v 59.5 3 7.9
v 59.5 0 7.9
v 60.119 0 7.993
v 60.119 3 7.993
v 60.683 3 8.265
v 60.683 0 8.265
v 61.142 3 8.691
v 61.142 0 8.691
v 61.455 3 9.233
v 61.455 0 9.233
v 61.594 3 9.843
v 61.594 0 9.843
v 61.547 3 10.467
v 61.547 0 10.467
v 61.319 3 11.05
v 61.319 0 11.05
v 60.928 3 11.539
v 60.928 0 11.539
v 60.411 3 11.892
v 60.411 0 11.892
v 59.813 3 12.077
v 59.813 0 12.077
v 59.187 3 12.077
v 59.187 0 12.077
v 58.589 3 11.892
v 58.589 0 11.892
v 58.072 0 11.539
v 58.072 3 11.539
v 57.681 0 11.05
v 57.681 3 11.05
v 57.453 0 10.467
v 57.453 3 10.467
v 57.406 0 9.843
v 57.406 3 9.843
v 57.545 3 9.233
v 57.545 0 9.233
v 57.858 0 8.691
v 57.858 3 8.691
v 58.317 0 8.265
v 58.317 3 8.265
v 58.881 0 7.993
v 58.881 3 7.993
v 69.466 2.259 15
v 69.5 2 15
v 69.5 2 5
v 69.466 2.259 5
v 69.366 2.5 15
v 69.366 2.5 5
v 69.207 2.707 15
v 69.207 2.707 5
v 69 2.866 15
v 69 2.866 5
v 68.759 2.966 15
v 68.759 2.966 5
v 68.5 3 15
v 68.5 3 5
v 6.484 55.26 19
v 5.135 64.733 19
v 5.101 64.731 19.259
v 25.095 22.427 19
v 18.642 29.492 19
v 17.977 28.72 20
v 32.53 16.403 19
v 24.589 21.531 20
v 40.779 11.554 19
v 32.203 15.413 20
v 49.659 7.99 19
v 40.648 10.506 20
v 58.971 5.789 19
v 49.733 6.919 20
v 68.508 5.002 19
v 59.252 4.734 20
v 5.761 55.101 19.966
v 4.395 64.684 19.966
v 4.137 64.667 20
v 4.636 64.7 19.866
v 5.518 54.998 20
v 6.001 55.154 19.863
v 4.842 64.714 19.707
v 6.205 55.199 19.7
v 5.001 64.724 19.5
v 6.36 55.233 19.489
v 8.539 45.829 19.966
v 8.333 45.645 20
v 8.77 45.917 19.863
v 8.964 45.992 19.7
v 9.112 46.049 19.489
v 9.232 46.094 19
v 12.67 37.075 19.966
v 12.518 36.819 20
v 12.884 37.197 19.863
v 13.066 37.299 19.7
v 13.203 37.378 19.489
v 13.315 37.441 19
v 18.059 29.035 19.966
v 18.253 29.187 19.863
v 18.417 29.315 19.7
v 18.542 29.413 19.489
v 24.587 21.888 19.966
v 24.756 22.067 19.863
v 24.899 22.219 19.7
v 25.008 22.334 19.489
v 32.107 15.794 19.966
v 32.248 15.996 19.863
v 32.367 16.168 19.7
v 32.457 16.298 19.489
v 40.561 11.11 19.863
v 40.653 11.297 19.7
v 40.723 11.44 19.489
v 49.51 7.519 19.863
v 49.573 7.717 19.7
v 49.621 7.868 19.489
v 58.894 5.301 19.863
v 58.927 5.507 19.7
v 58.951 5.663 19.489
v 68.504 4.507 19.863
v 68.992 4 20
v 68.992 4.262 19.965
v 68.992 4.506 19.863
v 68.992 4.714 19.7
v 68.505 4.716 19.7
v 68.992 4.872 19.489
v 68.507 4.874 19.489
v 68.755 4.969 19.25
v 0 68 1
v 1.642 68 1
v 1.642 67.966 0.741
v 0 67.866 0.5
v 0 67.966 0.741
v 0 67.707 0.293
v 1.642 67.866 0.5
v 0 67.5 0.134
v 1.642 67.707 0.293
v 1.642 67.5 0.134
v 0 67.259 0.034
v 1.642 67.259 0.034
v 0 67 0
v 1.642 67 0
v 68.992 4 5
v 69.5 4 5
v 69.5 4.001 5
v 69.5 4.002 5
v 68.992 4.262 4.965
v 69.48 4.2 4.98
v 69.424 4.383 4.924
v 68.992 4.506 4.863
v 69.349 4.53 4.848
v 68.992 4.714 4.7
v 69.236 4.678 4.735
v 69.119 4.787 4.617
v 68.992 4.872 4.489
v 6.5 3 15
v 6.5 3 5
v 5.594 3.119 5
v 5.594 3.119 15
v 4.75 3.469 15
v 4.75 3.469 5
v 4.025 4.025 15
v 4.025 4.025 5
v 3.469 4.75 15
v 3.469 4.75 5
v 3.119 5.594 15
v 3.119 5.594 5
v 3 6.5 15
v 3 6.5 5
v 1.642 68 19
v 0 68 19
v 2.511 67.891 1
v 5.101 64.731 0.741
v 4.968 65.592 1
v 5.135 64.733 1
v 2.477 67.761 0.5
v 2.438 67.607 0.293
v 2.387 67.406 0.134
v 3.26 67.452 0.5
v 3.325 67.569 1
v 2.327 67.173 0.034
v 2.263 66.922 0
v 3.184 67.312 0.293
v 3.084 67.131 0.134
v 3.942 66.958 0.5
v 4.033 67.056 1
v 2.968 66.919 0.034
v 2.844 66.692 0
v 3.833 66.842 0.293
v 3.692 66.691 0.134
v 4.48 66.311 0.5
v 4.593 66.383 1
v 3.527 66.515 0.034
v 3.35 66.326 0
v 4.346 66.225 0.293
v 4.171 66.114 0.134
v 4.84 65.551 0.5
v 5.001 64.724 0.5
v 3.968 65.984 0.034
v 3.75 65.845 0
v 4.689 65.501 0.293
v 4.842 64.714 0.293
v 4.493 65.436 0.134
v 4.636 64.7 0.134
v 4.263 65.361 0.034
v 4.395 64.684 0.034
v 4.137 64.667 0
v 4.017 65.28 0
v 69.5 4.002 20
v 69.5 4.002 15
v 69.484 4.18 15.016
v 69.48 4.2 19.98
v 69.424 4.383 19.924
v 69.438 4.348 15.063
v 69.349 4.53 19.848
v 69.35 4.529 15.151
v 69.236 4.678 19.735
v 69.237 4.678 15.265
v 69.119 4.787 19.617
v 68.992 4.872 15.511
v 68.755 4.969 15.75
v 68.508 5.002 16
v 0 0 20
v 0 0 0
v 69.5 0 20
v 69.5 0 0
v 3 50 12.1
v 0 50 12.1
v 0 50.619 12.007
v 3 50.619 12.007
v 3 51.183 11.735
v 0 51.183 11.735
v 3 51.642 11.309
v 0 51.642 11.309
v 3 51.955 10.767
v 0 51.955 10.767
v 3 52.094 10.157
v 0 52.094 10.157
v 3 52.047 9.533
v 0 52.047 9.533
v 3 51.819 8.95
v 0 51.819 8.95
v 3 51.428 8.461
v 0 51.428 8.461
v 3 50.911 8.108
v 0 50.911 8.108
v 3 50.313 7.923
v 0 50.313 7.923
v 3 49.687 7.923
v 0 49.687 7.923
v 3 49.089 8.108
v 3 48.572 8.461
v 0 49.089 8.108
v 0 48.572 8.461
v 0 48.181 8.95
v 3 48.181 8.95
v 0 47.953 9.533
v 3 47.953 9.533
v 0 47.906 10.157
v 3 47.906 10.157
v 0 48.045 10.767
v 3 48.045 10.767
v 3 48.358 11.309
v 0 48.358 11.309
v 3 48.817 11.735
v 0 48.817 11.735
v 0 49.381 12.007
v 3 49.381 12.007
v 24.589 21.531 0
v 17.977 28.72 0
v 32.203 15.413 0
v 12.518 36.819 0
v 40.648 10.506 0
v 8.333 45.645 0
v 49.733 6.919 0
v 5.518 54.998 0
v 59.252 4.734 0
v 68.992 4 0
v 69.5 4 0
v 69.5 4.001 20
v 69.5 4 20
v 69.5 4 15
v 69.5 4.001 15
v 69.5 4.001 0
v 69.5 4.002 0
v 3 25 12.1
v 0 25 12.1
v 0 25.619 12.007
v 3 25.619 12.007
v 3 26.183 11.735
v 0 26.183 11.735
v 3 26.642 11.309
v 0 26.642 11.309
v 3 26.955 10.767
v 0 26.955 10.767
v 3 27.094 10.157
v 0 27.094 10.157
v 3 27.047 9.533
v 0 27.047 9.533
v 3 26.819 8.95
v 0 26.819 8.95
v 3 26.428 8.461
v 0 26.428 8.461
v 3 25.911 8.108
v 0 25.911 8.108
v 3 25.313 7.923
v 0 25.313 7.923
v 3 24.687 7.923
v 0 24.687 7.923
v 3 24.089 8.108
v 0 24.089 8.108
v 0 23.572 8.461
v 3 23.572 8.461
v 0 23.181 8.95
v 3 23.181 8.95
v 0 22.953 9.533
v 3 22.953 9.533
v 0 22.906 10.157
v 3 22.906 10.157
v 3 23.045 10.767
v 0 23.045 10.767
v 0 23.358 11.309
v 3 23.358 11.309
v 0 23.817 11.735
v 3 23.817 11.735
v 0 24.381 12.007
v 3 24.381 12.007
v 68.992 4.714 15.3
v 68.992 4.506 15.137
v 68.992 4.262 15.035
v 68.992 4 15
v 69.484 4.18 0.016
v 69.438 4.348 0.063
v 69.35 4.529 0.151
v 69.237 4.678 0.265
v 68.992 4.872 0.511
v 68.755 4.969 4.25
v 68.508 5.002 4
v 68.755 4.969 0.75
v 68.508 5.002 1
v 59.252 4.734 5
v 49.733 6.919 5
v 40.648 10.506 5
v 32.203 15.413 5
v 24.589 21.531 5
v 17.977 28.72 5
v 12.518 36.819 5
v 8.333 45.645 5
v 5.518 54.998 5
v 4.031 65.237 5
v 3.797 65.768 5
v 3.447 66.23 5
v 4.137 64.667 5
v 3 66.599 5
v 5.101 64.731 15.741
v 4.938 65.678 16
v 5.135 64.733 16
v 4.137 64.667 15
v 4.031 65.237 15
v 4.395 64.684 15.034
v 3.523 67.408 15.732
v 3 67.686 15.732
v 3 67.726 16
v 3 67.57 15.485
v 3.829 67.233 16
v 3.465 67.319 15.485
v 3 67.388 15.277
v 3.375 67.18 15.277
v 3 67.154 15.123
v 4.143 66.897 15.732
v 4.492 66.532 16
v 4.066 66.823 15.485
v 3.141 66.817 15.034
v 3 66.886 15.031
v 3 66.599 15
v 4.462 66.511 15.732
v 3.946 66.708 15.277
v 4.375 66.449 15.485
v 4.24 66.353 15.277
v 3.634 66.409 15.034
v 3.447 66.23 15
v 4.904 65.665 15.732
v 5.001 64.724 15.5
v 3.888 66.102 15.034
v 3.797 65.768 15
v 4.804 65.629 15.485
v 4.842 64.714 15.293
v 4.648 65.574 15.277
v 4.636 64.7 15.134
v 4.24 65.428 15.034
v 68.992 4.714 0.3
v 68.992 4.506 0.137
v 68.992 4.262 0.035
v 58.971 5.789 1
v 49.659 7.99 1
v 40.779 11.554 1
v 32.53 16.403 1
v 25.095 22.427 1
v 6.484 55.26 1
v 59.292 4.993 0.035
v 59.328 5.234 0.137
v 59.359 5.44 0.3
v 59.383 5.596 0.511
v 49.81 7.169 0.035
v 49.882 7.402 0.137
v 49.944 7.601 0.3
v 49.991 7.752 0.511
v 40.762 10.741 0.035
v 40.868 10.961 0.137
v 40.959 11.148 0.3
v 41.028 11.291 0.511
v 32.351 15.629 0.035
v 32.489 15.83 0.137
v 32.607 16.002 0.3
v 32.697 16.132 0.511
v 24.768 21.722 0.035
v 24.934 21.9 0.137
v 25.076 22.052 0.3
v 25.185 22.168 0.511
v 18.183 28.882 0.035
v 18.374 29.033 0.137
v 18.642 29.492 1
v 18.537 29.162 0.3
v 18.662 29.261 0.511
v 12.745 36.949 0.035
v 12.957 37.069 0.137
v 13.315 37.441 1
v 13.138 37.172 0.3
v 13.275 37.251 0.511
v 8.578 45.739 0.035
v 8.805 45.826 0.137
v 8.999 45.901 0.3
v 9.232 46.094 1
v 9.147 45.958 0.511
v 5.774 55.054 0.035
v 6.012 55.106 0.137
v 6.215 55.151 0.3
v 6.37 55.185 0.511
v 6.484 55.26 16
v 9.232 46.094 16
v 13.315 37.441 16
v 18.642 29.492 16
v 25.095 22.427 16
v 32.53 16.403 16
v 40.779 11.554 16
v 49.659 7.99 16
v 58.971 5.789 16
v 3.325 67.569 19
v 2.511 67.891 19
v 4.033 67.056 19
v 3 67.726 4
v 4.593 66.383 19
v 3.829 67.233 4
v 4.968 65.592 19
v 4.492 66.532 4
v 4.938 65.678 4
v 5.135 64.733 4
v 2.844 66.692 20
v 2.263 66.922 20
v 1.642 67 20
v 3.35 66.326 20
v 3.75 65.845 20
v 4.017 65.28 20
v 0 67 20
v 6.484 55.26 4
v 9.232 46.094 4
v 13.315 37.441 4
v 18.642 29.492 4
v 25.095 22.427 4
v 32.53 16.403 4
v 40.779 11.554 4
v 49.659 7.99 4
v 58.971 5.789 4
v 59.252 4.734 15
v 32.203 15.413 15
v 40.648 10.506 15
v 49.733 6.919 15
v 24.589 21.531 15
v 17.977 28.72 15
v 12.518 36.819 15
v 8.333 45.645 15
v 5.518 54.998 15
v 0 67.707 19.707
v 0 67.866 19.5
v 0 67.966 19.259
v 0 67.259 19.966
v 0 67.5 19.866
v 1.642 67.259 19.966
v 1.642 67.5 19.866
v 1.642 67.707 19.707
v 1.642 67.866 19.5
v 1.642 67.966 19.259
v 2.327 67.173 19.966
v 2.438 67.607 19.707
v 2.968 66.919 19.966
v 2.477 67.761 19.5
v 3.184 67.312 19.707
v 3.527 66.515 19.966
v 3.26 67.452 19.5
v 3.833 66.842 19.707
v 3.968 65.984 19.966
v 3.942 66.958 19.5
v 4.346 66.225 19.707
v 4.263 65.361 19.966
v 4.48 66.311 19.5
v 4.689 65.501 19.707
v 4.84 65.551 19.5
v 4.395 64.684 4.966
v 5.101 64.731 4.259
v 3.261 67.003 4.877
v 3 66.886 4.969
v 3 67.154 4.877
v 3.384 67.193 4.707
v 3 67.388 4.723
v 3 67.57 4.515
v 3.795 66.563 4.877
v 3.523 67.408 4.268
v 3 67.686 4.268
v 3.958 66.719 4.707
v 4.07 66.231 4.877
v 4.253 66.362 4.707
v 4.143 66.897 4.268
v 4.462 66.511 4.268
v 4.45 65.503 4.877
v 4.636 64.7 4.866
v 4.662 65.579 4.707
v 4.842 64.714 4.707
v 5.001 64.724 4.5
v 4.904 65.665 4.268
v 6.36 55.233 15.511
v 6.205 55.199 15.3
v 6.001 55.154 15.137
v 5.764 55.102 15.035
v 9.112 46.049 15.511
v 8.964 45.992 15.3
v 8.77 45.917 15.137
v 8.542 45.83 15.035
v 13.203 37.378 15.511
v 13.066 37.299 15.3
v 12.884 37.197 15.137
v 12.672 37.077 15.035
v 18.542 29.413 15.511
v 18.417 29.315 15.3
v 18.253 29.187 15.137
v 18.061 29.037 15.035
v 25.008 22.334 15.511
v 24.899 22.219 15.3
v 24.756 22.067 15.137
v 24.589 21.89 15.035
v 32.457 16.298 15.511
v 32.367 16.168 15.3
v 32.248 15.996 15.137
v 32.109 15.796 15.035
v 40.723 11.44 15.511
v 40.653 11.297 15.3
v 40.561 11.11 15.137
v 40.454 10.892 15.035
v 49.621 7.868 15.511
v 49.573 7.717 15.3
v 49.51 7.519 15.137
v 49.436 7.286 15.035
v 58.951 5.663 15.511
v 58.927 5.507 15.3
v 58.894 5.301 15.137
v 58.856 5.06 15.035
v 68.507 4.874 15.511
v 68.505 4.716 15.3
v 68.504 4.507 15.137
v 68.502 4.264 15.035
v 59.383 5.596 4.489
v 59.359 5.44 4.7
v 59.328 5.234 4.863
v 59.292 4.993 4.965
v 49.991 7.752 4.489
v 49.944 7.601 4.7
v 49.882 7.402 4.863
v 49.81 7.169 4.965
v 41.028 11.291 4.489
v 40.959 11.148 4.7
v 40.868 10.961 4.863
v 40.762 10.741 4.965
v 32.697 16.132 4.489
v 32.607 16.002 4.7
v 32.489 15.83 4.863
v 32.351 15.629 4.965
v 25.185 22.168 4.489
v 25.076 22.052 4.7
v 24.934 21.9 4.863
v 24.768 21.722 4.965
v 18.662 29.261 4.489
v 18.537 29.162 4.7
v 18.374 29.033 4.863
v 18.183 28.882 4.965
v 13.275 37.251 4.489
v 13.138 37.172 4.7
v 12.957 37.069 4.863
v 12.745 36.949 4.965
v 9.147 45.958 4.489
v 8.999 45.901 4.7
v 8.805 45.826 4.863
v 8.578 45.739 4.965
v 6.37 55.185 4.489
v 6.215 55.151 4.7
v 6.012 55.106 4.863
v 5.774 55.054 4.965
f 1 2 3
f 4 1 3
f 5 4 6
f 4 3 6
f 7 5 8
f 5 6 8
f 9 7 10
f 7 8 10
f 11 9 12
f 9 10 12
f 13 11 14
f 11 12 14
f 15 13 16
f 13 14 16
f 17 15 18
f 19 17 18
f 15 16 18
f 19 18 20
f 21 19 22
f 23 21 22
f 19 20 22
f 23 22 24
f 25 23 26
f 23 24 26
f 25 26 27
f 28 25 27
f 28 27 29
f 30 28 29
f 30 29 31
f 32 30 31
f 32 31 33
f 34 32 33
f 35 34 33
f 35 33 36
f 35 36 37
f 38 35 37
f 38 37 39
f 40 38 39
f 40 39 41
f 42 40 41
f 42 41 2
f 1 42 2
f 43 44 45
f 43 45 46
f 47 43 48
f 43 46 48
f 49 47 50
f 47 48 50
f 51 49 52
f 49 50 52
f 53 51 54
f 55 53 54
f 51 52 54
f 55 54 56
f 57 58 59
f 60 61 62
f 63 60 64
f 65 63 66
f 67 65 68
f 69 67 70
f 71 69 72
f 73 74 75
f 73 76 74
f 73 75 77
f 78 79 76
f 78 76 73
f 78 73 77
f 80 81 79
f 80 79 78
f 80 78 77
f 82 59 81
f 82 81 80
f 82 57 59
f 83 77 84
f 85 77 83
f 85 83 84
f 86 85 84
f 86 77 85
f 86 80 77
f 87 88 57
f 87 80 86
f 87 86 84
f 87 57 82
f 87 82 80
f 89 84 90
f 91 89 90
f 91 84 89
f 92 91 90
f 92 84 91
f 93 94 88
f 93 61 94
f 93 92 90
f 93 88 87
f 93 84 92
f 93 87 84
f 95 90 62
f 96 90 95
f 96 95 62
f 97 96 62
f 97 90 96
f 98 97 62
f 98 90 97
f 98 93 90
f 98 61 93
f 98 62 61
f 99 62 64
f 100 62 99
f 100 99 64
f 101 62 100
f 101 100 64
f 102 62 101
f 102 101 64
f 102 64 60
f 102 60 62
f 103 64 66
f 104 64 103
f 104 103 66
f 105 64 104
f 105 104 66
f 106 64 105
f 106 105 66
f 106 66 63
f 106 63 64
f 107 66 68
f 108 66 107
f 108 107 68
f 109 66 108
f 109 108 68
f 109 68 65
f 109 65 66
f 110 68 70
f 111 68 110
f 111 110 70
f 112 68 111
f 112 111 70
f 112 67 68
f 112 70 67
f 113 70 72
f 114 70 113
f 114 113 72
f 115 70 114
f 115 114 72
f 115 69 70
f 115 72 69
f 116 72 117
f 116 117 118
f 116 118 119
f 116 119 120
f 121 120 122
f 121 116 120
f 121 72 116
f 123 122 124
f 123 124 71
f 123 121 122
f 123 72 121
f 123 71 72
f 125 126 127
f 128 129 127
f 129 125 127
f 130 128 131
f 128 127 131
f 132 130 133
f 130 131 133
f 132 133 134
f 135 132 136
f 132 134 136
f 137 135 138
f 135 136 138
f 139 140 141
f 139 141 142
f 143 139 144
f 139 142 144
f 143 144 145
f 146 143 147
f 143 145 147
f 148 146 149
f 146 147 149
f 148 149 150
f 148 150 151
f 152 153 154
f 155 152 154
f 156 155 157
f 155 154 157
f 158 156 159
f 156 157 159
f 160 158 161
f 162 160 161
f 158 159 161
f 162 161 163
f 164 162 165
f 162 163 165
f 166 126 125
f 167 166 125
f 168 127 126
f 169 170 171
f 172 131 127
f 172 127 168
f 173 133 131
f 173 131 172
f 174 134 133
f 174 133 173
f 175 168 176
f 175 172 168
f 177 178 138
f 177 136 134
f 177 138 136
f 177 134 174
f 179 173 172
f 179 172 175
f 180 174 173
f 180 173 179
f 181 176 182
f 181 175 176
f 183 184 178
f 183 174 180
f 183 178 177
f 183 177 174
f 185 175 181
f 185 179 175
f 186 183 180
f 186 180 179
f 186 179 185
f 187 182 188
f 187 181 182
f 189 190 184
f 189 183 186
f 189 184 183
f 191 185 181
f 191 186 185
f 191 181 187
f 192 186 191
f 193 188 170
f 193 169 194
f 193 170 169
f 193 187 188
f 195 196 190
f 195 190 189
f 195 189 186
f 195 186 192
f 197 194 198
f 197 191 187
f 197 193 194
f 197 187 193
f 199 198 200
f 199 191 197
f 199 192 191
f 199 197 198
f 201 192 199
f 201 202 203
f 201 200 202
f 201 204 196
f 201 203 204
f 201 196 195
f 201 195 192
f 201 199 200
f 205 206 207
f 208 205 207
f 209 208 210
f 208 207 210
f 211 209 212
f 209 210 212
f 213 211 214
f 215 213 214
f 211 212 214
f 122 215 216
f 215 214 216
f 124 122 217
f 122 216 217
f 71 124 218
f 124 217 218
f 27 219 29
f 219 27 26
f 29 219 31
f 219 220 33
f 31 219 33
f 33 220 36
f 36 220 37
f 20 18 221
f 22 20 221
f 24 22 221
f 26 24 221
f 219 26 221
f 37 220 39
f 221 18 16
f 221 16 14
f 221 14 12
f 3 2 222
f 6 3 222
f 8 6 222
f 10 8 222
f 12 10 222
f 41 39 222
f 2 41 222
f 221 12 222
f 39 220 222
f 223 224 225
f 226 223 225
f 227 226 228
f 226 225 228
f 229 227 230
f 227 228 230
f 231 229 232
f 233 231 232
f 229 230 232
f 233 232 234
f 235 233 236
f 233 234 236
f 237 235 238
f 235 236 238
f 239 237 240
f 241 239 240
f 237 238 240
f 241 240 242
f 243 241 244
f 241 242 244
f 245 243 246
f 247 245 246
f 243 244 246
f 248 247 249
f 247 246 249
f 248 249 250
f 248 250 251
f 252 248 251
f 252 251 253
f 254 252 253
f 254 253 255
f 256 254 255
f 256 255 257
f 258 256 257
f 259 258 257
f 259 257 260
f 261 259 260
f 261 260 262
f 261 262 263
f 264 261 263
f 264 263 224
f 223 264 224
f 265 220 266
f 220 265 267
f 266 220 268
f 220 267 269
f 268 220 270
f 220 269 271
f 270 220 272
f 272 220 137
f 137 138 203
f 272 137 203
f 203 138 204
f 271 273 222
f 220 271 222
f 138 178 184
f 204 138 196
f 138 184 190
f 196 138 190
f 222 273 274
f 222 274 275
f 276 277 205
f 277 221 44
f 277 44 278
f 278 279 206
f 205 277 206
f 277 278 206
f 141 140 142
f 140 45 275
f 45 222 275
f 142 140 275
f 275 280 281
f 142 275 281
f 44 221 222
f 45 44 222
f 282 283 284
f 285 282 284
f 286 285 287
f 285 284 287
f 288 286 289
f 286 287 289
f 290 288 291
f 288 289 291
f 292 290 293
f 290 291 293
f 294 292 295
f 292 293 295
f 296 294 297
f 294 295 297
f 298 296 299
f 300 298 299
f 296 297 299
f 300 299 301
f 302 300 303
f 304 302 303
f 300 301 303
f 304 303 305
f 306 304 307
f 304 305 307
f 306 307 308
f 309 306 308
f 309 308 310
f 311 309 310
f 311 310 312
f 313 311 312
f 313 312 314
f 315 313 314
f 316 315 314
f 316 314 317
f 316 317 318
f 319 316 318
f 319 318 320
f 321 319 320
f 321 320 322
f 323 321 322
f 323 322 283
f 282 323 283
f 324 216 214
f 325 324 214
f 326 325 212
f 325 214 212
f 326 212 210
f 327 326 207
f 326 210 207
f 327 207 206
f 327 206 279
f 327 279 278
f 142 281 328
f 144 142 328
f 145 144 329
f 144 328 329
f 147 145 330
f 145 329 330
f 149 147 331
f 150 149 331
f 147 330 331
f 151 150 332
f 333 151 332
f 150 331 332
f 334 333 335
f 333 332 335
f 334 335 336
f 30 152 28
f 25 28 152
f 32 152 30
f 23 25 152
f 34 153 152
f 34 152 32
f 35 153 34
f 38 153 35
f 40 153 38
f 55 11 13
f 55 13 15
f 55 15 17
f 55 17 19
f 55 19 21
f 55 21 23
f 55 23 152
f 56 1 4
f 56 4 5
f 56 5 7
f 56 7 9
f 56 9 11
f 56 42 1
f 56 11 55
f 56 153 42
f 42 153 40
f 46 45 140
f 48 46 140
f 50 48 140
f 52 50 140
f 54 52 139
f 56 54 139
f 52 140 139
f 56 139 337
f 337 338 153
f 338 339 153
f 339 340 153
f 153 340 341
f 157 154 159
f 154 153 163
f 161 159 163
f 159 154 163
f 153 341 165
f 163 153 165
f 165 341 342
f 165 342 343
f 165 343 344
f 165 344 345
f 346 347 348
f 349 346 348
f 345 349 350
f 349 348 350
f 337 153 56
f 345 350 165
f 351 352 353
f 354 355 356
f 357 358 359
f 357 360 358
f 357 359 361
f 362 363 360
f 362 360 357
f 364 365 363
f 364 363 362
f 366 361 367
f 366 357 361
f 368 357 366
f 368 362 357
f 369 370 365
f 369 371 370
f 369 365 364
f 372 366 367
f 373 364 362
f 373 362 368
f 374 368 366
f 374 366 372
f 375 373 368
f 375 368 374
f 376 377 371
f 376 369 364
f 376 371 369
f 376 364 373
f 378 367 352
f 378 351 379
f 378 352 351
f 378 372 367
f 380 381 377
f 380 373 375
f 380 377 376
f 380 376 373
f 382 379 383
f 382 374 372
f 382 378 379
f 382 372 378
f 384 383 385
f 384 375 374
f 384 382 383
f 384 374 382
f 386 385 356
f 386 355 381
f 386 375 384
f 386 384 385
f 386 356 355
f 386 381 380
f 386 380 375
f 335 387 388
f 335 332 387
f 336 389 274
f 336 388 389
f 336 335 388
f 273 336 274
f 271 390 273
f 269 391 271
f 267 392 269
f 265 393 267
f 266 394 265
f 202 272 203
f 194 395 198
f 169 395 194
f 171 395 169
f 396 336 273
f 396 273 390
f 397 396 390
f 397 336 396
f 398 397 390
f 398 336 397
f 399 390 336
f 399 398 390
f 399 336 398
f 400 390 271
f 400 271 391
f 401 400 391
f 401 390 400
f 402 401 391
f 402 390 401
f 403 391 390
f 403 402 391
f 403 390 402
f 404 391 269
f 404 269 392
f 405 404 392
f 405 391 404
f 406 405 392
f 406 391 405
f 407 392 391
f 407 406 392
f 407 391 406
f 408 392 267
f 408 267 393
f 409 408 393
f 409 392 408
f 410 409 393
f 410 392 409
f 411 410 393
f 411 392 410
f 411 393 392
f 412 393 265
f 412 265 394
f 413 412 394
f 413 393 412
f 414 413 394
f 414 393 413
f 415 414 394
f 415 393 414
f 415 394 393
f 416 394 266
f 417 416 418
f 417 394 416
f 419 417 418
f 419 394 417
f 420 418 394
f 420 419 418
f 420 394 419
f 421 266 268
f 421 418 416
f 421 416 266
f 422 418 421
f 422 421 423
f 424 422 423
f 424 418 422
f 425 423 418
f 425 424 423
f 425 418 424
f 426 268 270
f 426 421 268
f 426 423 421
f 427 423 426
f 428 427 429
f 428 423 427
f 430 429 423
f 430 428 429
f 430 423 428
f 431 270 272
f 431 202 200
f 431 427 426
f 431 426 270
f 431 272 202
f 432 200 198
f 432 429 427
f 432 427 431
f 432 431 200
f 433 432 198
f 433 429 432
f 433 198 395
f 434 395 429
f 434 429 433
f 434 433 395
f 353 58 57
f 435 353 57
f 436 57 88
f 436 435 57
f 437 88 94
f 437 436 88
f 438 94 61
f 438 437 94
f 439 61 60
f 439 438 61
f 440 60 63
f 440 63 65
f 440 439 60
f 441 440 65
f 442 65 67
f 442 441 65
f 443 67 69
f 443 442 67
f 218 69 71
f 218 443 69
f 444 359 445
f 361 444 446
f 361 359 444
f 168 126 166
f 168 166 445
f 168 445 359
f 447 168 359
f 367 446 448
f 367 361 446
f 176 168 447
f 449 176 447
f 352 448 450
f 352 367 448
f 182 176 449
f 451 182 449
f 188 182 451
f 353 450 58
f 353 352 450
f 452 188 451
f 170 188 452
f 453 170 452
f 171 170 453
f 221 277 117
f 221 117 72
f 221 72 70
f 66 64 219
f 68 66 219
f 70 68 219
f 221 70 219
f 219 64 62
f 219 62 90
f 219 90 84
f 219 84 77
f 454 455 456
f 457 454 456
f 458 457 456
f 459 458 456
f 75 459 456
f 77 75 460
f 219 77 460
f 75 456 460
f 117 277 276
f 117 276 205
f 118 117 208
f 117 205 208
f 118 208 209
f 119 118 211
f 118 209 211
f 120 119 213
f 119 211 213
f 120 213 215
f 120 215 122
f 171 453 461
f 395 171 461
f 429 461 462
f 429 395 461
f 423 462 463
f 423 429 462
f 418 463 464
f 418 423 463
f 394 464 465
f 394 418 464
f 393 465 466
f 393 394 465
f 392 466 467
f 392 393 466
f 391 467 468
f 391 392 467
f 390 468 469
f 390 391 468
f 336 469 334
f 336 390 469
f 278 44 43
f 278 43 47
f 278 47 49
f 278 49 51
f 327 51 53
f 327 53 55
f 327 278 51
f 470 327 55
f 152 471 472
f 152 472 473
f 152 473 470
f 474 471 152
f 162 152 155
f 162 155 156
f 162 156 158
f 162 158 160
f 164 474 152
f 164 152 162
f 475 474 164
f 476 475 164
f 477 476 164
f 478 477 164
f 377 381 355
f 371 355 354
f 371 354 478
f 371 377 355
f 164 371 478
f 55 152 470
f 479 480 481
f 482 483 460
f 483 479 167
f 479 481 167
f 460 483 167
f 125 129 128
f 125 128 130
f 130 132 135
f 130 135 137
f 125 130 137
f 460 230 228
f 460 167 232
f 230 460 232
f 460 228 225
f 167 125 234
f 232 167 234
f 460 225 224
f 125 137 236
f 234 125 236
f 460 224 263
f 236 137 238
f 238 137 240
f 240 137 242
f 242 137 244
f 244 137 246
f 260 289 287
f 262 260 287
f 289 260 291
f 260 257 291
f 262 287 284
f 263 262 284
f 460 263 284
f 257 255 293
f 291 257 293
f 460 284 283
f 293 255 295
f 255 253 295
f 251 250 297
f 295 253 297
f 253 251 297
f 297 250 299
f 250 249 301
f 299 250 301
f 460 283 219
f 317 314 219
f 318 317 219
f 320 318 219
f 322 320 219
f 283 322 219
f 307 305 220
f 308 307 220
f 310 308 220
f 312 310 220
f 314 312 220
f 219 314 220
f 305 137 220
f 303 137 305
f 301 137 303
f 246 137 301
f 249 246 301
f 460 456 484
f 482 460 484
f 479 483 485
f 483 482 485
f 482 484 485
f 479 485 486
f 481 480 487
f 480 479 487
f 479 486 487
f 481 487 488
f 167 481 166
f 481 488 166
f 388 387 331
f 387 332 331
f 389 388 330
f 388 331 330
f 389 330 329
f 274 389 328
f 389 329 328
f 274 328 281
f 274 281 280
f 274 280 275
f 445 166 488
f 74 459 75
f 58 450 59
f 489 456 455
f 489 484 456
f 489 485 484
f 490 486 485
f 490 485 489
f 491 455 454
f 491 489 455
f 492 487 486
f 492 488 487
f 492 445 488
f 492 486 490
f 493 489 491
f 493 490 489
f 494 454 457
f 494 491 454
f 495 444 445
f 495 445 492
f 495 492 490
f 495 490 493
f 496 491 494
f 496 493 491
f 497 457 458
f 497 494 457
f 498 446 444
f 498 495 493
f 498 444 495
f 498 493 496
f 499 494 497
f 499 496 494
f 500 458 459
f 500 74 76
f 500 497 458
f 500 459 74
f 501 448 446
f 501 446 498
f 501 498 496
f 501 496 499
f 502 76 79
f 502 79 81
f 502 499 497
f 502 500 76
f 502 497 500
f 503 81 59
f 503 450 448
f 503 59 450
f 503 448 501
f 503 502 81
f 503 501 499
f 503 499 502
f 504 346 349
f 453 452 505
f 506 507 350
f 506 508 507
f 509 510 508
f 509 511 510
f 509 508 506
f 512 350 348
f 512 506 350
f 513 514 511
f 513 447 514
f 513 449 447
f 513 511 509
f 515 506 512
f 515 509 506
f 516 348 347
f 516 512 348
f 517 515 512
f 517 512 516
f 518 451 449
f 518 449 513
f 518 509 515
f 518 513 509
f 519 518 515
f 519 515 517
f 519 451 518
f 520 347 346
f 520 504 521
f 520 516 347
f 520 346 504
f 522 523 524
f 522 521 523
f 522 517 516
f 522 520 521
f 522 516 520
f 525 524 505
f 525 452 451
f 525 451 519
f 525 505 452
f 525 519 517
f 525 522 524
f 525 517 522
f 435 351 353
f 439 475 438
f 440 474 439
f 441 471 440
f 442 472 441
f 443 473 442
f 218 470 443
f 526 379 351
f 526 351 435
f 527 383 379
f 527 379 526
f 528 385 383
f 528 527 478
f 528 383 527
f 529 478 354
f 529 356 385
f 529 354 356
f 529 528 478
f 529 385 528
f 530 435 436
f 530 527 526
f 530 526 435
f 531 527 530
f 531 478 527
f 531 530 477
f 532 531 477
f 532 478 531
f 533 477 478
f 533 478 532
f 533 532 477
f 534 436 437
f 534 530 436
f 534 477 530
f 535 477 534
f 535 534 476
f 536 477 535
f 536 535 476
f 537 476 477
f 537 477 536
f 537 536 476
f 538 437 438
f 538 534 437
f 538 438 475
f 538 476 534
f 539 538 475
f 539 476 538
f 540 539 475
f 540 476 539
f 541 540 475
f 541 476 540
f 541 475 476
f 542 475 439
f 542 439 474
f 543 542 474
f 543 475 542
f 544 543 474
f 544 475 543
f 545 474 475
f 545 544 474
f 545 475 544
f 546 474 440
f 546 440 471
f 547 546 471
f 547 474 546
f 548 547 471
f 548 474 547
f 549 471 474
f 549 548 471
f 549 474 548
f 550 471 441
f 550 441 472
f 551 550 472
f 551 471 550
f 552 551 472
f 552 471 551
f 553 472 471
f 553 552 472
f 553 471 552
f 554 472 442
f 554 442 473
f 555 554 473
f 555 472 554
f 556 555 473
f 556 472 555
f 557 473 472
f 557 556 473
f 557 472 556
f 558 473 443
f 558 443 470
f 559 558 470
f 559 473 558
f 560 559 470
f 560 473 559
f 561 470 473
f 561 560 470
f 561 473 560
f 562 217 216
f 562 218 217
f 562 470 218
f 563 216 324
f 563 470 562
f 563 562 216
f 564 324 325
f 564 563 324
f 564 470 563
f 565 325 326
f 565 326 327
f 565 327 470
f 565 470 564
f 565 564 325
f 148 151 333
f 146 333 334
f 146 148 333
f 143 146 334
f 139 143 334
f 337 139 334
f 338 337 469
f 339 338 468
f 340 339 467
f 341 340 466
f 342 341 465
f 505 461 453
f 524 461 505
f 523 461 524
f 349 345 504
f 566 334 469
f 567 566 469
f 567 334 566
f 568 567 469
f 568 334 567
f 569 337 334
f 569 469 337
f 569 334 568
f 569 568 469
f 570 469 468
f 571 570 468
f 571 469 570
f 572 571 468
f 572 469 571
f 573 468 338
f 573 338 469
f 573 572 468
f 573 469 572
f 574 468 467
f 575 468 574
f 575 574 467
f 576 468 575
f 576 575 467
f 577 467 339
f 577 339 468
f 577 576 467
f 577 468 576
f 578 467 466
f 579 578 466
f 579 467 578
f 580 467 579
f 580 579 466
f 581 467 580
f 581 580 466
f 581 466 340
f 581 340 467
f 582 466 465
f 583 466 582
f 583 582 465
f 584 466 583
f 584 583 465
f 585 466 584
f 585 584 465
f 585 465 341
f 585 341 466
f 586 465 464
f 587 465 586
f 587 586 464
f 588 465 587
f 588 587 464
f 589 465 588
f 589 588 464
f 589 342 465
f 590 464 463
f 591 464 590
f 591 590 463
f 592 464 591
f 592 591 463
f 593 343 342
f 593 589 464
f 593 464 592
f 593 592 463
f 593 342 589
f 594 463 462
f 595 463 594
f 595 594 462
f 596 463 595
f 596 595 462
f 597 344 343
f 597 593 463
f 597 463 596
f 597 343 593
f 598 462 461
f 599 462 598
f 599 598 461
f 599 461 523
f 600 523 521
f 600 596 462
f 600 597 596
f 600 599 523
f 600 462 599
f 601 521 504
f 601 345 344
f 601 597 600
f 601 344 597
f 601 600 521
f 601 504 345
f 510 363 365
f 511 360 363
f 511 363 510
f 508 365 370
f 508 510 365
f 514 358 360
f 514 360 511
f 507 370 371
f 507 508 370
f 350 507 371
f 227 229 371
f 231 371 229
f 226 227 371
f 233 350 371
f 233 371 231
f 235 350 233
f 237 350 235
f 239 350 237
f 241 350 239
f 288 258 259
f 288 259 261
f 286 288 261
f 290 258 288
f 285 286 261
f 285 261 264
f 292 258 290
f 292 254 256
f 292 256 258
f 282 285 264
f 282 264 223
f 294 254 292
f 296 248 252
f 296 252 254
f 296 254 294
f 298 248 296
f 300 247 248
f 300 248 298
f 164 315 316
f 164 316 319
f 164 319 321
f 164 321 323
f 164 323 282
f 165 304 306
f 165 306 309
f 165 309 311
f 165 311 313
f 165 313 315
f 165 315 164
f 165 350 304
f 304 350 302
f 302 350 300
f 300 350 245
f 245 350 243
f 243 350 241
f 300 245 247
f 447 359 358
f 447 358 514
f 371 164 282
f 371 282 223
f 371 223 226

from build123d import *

# Parameters (mm, degrees)
BOSS_EXTRUDE1_DEPTH = 20
CUT_EXTRUDE1_DEPTH  = 15
BOSS_EXTRUDE2_DEPTH = 5
CUT_EXTRUDE2_REACH  = 101.269
SKETCH2_R           = 2.100000000000004
CUT_EXTRUDE3_REACH  = 101.269
SKETCH3_R           = 2.100000000000001
SKETCH3_R_2         = 2.099999999999995
FILLET2_R           = 64
FILLET3_START       = -1
FILLET3_DEPTH       = 22
FILLET3_START_2     = 2.0548
FILLET3_2_DEPTH     = 16
FILLET4_R           = 1


with BuildPart() as part:
    # Sketch1 → Boss-Extrude1 (new body)
    with BuildSketch(Plane.XY):
        Polygon((69.5, 5.000000000000004), (5, 5), (5.000000000000004, 67.99999999999999), (0, 68), (0, 0), (69.49999999999999, 0), align=None)
    extrude(amount=BOSS_EXTRUDE1_DEPTH)

    # Sketch1<3> → Cut-Extrude1 (cut)
    with BuildSketch(Plane.XY):
        Polygon((69.5, 5.000000000000004), (5, 5), (5.000000000000004, 67.99999999999999), (3.0000000000000027, 68), (3.000000000000001, 3), (69.5, 3.000000000000002), align=None)
    extrude(amount=CUT_EXTRUDE1_DEPTH, mode=Mode.SUBTRACT)

    # Sketch1<4> → Boss-Extrude2 (add)
    with BuildSketch(Plane.XY):
        Polygon((69.5, 5.000000000000004), (5, 5), (5.000000000000004, 67.99999999999999), (3.0000000000000027, 68), (3.000000000000001, 3), (69.5, 3.000000000000002), align=None)
    extrude(amount=BOSS_EXTRUDE2_DEPTH)

    # Sketch2 → Cut-Extrude2 (cut, up to next)
    with BuildSketch(Plane.XZ, mode=Mode.PRIVATE) as cut_extrude2_sk1:
        with Locations(Location((59.5, 10, 0), (0, 0, 270))):
            Circle(SKETCH2_R)
    cut_extrude2_tool1 = extrude(cut_extrude2_sk1.sketch, amount=-CUT_EXTRUDE2_REACH, mode=Mode.PRIVATE) & part.part
    add(cut_extrude2_tool1.solids().sort_by_distance((59.5, 0, 10))[0], mode=Mode.SUBTRACT)

    # Sketch3 → Cut-Extrude3 (cut, up to next)
    with BuildSketch(Plane.ZY, mode=Mode.PRIVATE) as cut_extrude3_sk1:
        with Locations((10, 24.999999999999996)):
            Circle(SKETCH3_R)
    cut_extrude3_tool1 = extrude(cut_extrude3_sk1.sketch, amount=-CUT_EXTRUDE3_REACH, mode=Mode.PRIVATE) & part.part
    # Sketch3 → Cut-Extrude3 (cut, up to next)
    with BuildSketch(Plane.ZY, mode=Mode.PRIVATE) as cut_extrude3_sk2:
        with Locations((10, 50)):
            Circle(SKETCH3_R_2)
    cut_extrude3_tool2 = extrude(cut_extrude3_sk2.sketch, amount=-CUT_EXTRUDE3_REACH, mode=Mode.PRIVATE) & part.part
    add(cut_extrude3_tool1.solids().sort_by_distance((0, 25, 10))[0], mode=Mode.SUBTRACT)
    add(cut_extrude3_tool2.solids().sort_by_distance((0, 50, 10))[0], mode=Mode.SUBTRACT)

    # Fillet2
    # the kernel refuses this fillet: 64 mm, written as the material it adds along each edge
    with BuildSketch(Plane(origin=(5.000000000000001, 5, -144.98046755776159), x_dir=(1, 0, 0), z_dir=(0, 0, 1))) as fillet2_piece_1_section:
        with BuildLine():
            CenterArc((63.992187023104634, 64), FILLET2_R, 180.89528298657015, 89.10471701342988)
            Line((6.22e-15, 62.999999999999986), (-1.2798437404620864, 62.97999999999999))
            ThreePointArc((-1.2798437404620864, 62.97999999999999), (-1.2799999999999976, 31.499999999999993), (-1.2800000000000002, 0))
            Line((-1.2800000000000002, 0), (0, -1.2800000000000002))
            Line((0, -1.2800000000000002), (63.992187023104634, -1.2800000000000002))
            Line((63.992187023104634, -1.2800000000000002), (63.992187023104634, 0))
        make_face()
    fillet2_piece_1 = extrude(amount=164.98046755776159, mode=Mode.PRIVATE)
    fillet2_piece_1 = split(fillet2_piece_1, bisect_by=Plane(origin=(5.000000000000001, 5, 0), z_dir=(0, 0, 1)), keep=Keep.TOP, mode=Mode.PRIVATE)
    fillet2_piece_1 = split(fillet2_piece_1, bisect_by=Plane(origin=(5.000000000000001, 5, 5), z_dir=(0, 0, -1)), keep=Keep.TOP, mode=Mode.PRIVATE)
    add(fillet2_piece_1)
    with BuildSketch(Plane(origin=(5.000000000000001, 5, 15), x_dir=(1, 0, 0), z_dir=(0, 0, 1))) as fillet2_piece_2:
        with BuildLine():
            CenterArc((63.992187023104634, 64), FILLET2_R, 180.89528298657015, 89.10471701342988)
            Line((6.22e-15, 62.999999999999986), (-1.2798437404620864, 62.97999999999999))
            ThreePointArc((-1.2798437404620864, 62.97999999999999), (-1.2799999999999976, 31.499999999999993), (-1.2800000000000002, 0))
            Line((-1.2800000000000002, 0), (0, -1.2800000000000002))
            Line((0, -1.2800000000000002), (63.992187023104634, -1.2800000000000002))
            Line((63.992187023104634, -1.2800000000000002), (63.992187023104634, 0))
        make_face()
    extrude(amount=5)
    with BuildSketch(Plane(origin=(5.000000000000001, 5, 0), x_dir=(1, 0, 0), z_dir=(0, 0, 1))) as fillet2_piece_3:
        with BuildLine():
            CenterArc((63.992187023104634, 64), FILLET2_R, 180.89528298657012, 89.10471701342988)
            Line((6.22e-15, 63), (-1.2798437404620864, 62.980000000000004))
            ThreePointArc((-1.2798437404620864, 62.980000000000004), (-1.2799999999999976, 31.5), (-1.2800000000000002, 0))
            Line((-1.2800000000000002, 0), (0, -1.2800000000000002))
            Line((0, -1.2800000000000002), (63.992187023104634, -1.2800000000000002))
            Line((63.992187023104634, -1.2800000000000002), (63.992187023104634, 0))
        make_face()
    extrude(amount=5)
    with BuildSketch(Plane(origin=(5.000000000000001, 5, 0), x_dir=(1, 0, 0), z_dir=(0, 0, 1))) as fillet2_piece_4_section:
        with BuildLine():
            CenterArc((63.992187023104634, 64), FILLET2_R, 180.89528298657012, 89.10471701342988)
            Line((6.22e-15, 63), (-1.2798437404620864, 62.980000000000004))
            ThreePointArc((-1.2798437404620864, 62.980000000000004), (-1.2799999999999976, 31.5), (-1.2800000000000002, 0))
            Line((-1.2800000000000002, 0), (0, -1.2800000000000002))
            Line((0, -1.2800000000000002), (63.992187023104634, -1.2800000000000002))
            Line((63.992187023104634, -1.2800000000000002), (63.992187023104634, 0))
        make_face()
    fillet2_piece_4 = extrude(amount=164.98046755776159, mode=Mode.PRIVATE)
    fillet2_piece_4 = split(fillet2_piece_4, bisect_by=Plane(origin=(5.000000000000001, 5, 15), z_dir=(0, 0, 1)), keep=Keep.TOP, mode=Mode.PRIVATE)
    fillet2_piece_4 = split(fillet2_piece_4, bisect_by=Plane(origin=(5.000000000000001, 5, 20), z_dir=(0, 0, -1)), keep=Keep.TOP, mode=Mode.PRIVATE)
    add(fillet2_piece_4)

    # Fillet3: read off the stored shape, not the designer's step
    # Fillet3 outline → Fillet3 (cut)
    with BuildSketch(Plane.XY.offset(FILLET3_START)):
        with BuildLine():
            ThreePointArc((5.134567622, 64.733333333), (5.046420717, 66.365807229), (5, 68))
            Line((5, 68), (1.642354061, 68))
            ThreePointArc((1.642354061, 68), (4.03330924, 67.056038602), (5.134567622, 64.733333333))
        make_face()
    extrude(amount=FILLET3_DEPTH, mode=Mode.SUBTRACT)

    # Fillet3 2 outline → Fillet3 2 (add)
    with BuildSketch(Plane.XY.offset(FILLET3_START_2)):
        with BuildLine():
            ThreePointArc((6.5, 3), (4.025126266, 4.025126266), (3, 6.5))
            Line((3, 6.5), (3, 3))
            Line((3, 3), (6.5, 3))
        make_face()
    extrude(amount=FILLET3_2_DEPTH)

    # Fillet4
    # the kernel refuses this fillet: 1 mm, written as the material it takes off along each edge
    with BuildSketch(Plane(origin=(1.6423540609999998, 68, 0), x_dir=(0, 0, 1), z_dir=(-1, 0, 0))) as fillet4_piece_1:
        with BuildLine():
            CenterArc((FILLET4_R, -FILLET4_R), FILLET4_R, 90, 90)
            Line((-1.1e-16, -FILLET4_R), (0, 0))
            Line((0, 0), (FILLET4_R, 0))
        make_face()
    extrude(amount=4.142354061, mode=Mode.SUBTRACT)
    with BuildSketch(Plane(origin=(1.6423540609999998, 68, 20), x_dir=(-2.84e-15, -1, 0), z_dir=(-1, 2.84e-15, 0))) as fillet4_piece_2:
        with BuildLine():
            CenterArc((FILLET4_R, -FILLET4_R), FILLET4_R, 90, 90)
            Line((0, -FILLET4_R), (0, 0))
            Line((0, 0), (FILLET4_R, 0))
        make_face()
    extrude(amount=4.142354061, mode=Mode.SUBTRACT)
    with BuildSketch(Plane(origin=(68.992187023105, 69, 0), x_dir=(-2.2e-16, -1, 0), z_dir=(1, -2.2e-16, 0))) as fillet4_piece_3:
        with BuildLine():
            CenterArc((64 + FILLET4_R, -FILLET4_R), FILLET4_R, 90, 90)
            Line((64, -FILLET4_R), (64, 0))
            Line((64, 0), (64 + FILLET4_R, 0))
        make_face()
    revolve(axis=Axis((68.992187023105, 69, 0), (0, 0, -1)), revolution_arc=86.1774462704384, mode=Mode.SUBTRACT)
    with BuildSketch(Plane(origin=(68.992187023105, 69, 15), x_dir=(-0.9977753031393836, -0.06666666667166976, 0), z_dir=(-0.06666666667166976, 0.9977753031393836, 0))) as fillet4_piece_4:
        with BuildLine():
            CenterArc((64.00000000000001 + FILLET4_R, FILLET4_R), FILLET4_R, 180, 90)
            Line((64.00000000000001 + FILLET4_R, 0), (64.00000000000001, 0))
            Line((64.00000000000001, 0), (64, FILLET4_R))
        make_face()
    revolve(axis=Axis((68.992187023105, 69, 15), (0, 0, 1)), revolution_arc=86.17744627043835, mode=Mode.SUBTRACT)
    with BuildSketch(Plane(origin=(68.992187023105, 69, 20), x_dir=(-0.9977753031393836, -0.06666666667166976, 0), z_dir=(-0.06666666667166976, 0.9977753031393836, 0))) as fillet4_piece_5:
        with BuildLine():
            CenterArc((64.00000000000001 + FILLET4_R, -FILLET4_R), FILLET4_R, 90, 90)
            Line((64.00000000000001 + FILLET4_R, 0), (64.00000000000001, 0))
            Line((64.00000000000001, 0), (64, -FILLET4_R))
        make_face()
    revolve(axis=Axis((68.992187023105, 69, 20), (0, 0, 1)), revolution_arc=86.17744627043835, mode=Mode.SUBTRACT)
    with BuildSketch(Plane(origin=(69.5, 3.0000000000000027, 5), x_dir=(-1, -4.4e-16, 0), z_dir=(0, 0, 1))) as fillet4_piece_6:
        with BuildLine():
            CenterArc((FILLET4_R, FILLET4_R), FILLET4_R, 179.99999999999983, 90.00000000000011)
            Line((4.4e-16, FILLET4_R), (0, 0))
            Line((0, 0), (FILLET4_R, 0))
        make_face()
    extrude(amount=10, mode=Mode.SUBTRACT)
    with BuildSketch(Plane(origin=(68.992187023105, 69, 5), x_dir=(6.7e-16, -1, 0), z_dir=(1, 6.7e-16, 0))) as fillet4_piece_7:
        with BuildLine():
            CenterArc((64 + FILLET4_R, FILLET4_R), FILLET4_R, 180, 90)
            Line((64 + FILLET4_R, 0), (64, 0))
            Line((64, 0), (64, FILLET4_R))
        make_face()
    revolve(axis=Axis((68.992187023105, 69, 5), (0, 0, -1)), revolution_arc=86.17744627043844, mode=Mode.SUBTRACT)
    with BuildSketch(Plane(origin=(1.6423540620579629, 64.50000000114308, 0), x_dir=(-3.022750939428944e-10, 1.0, 0), z_dir=(-1.0, -3.022750939428944e-10, 0))) as fillet4_piece_8:
        with BuildLine():
            CenterArc((3.4999999988569215 - FILLET4_R, -FILLET4_R), FILLET4_R, 0, 90)
            Line((3.4999999988569215 - FILLET4_R, 0), (3.4999999988569215, 0))
            Line((3.4999999988569215, 0), (3.4999999988569215, -FILLET4_R))
        make_face()
    revolve(axis=Axis((1.6423540620579629, 64.50000000114308, 0), (0, 0, -1)), revolution_arc=86.17744631101748, mode=Mode.SUBTRACT)
    with BuildSketch(Plane(origin=(1.6423540620579629, 64.50000000114308, 20), x_dir=(-3.022750939428944e-10, 1.0, 0), z_dir=(-1.0, -3.022750939428944e-10, 0))) as fillet4_piece_9:
        with BuildLine():
            CenterArc((3.4999999988569215 - FILLET4_R, FILLET4_R), FILLET4_R, 270, 90)
            Line((3.4999999988569215, FILLET4_R), (3.4999999988569215, 0))
            Line((3.4999999988569215, 0), (3.4999999988569215 - FILLET4_R, 0))
        make_face()
    revolve(axis=Axis((1.6423540620579629, 64.50000000114308, 20), (0, 0, -1)), revolution_arc=86.17744631101748, mode=Mode.SUBTRACT)
    with BuildSketch(Plane(origin=(1.6423540620579629, 64.50000000114308, 15), x_dir=(-0.31084032918327265, 0.9504621453552133, 0), z_dir=(-0.9504621453552133, -0.31084032918327265, 0))) as fillet4_piece_10_section:
        with BuildLine():
            CenterArc((3.4999999988569215 - FILLET4_R, -FILLET4_R), FILLET4_R, 0, 90)
            Line((3.4999999988569215, -FILLET4_R), (3.4999999988569215, 0))
            Line((3.4999999988569215, 0), (3.4999999988569215 - FILLET4_R, 0))
        make_face()
    fillet4_piece_10 = revolve(axis=Axis((1.6423540620579629, 64.50000000114308, 15), (0, 0, -1)), revolution_arc=104.28732621151866, mode=Mode.PRIVATE)
    fillet4_piece_10 = split(fillet4_piece_10, bisect_by=Plane(origin=(3.0000000000000027, 64.50000000114308, 15), z_dir=(1, -3e-17, 0)), keep=Keep.TOP, mode=Mode.PRIVATE)
    add(fillet4_piece_10, mode=Mode.SUBTRACT)
    with BuildSketch(Plane(origin=(1.6423540620579629, 64.50000000114308, 5), x_dir=(-0.31084032918327265, 0.9504621453552133, 0), z_dir=(-0.9504621453552133, -0.31084032918327265, 0))) as fillet4_piece_11_section:
        with BuildLine():
            CenterArc((3.4999999988569215 - FILLET4_R, FILLET4_R), FILLET4_R, 270, 90)
            Line((3.4999999988569215 - FILLET4_R, 0), (3.4999999988569215, 0))
            Line((3.4999999988569215, 0), (3.499999998856922, FILLET4_R))
        make_face()
    fillet4_piece_11 = revolve(axis=Axis((1.6423540620579629, 64.50000000114308, 5), (0, 0, -1)), revolution_arc=104.28732621151866, mode=Mode.PRIVATE)
    fillet4_piece_11 = split(fillet4_piece_11, bisect_by=Plane(origin=(3.0000000000000027, 64.50000000114308, 5), z_dir=(1, -3e-17, 0)), keep=Keep.TOP, mode=Mode.PRIVATE)
    add(fillet4_piece_11, mode=Mode.SUBTRACT)
    with BuildSketch(Plane(origin=(69.5, 5.000000000000004, -2.4953413165722065), x_dir=(0, -1, 0), z_dir=(0, 0, 1))) as fillet4_piece_12:
        with BuildLine():
            CenterArc((0.9981365266288797, -1), FILLET4_R, 89.99999999999984, 89.56614602080991)
            Line((-0.00183480455002627, -0.992427891952218), (-0.10183193766791643, -0.9916706811474398))
            ThreePointArc((-0.10183193766791643, -0.9916706811474398), (-0.0999999999999952, -0.5078129768950106), (-0.09999999999999964, 0))
            Line((-0.09999999999999964, 0), (0, 0.09999999999999432))
            Line((0, 0.09999999999999432), (0.9981365266288824, 0.09999999999999432))
            Line((0.9981365266288824, 0.09999999999999432), (0.9981365266288824, 0))
        make_face()
    extrude(amount=9.990682633144413, mode=Mode.SUBTRACT)
    with BuildSketch(Plane(origin=(69.5, 5.000000000000004, 12.504658683427794), x_dir=(-0.9999982909664641, 0.0018488007331925382, 0), z_dir=(0, 0, 1))) as fillet4_piece_13:
        with BuildLine():
            CenterArc((0.9981529354241921, 0.9999836215132766), FILLET4_R, 180.10592853951772, 89.5661460208106)
            Line((-0.00184535554227194, 0.998134820780085), (-0.10184518463891266, 0.9979499407067657))
            Line((-0.10184518463891266, 0.9979499407067657), (-0.09999982909664072, -0.00018488007331924))
            Line((-0.09999982909664072, -0.00018488007331924), (0.00018488007331925, -0.09999982909664605))
            ThreePointArc((0.00018488007331925, -0.09999982909664605), (0.5079969890989224, -0.09906098409263343), (0.991857253310012, -0.09999836215132722))
            Line((0.991857253310012, -0.09999836215132722), (0.9924295880476661, 0))
        make_face()
    extrude(amount=9.990682633144415, mode=Mode.SUBTRACT)
    with BuildSketch(Plane(origin=(72, 5.000000000000004, 5), x_dir=(7e-17, -1, 0), z_dir=(-1, -7e-17, 0))) as fillet4_piece_14:
        with BuildLine():
            CenterArc((FILLET4_R, -FILLET4_R), FILLET4_R, 90, 90)
            Line((0, -FILLET4_R), (0, 0))
            Line((0, 0), (FILLET4_R, 0))
        make_face()
    extrude(amount=3.0078129768950106, mode=Mode.SUBTRACT)
    with BuildSketch(Plane(origin=(72, 5.000000000000004, 20), x_dir=(0, 0, -1), z_dir=(-1, -7e-17, 0))) as fillet4_piece_15:
        with BuildLine():
            CenterArc((FILLET4_R, FILLET4_R), FILLET4_R, 179.99999999999994, 90.00000000000006)
            Line((0, FILLET4_R), (0, 0))
            Line((0, 0), (FILLET4_R, 0))
        make_face()
    extrude(amount=3.0078129768950106, mode=Mode.SUBTRACT)
    with BuildSketch(Plane(origin=(72, 5.000000000000004, 15), x_dir=(7e-17, -1, 0), z_dir=(-1, -7e-17, 0))) as fillet4_piece_16:
        with BuildLine():
            CenterArc((FILLET4_R, FILLET4_R), FILLET4_R, 180, 90)
            Line((8.9e-16, FILLET4_R), (0, 0))
            Line((0, 0), (FILLET4_R, 0))
        make_face()
    extrude(amount=3.0078129768950106, mode=Mode.SUBTRACT)
    with BuildSketch(Plane(origin=(72, 5.000000000000004, 0), x_dir=(7e-17, -1, 0), z_dir=(-1, -7e-17, 0))) as fillet4_piece_17:
        with BuildLine():
            CenterArc((FILLET4_R, FILLET4_R), FILLET4_R, 180, 90)
            Line((0, FILLET4_R), (0, 0))
            Line((0, 0), (FILLET4_R, 0))
        make_face()
    extrude(amount=3.0078129768950106, mode=Mode.SUBTRACT)


solid = part.part
